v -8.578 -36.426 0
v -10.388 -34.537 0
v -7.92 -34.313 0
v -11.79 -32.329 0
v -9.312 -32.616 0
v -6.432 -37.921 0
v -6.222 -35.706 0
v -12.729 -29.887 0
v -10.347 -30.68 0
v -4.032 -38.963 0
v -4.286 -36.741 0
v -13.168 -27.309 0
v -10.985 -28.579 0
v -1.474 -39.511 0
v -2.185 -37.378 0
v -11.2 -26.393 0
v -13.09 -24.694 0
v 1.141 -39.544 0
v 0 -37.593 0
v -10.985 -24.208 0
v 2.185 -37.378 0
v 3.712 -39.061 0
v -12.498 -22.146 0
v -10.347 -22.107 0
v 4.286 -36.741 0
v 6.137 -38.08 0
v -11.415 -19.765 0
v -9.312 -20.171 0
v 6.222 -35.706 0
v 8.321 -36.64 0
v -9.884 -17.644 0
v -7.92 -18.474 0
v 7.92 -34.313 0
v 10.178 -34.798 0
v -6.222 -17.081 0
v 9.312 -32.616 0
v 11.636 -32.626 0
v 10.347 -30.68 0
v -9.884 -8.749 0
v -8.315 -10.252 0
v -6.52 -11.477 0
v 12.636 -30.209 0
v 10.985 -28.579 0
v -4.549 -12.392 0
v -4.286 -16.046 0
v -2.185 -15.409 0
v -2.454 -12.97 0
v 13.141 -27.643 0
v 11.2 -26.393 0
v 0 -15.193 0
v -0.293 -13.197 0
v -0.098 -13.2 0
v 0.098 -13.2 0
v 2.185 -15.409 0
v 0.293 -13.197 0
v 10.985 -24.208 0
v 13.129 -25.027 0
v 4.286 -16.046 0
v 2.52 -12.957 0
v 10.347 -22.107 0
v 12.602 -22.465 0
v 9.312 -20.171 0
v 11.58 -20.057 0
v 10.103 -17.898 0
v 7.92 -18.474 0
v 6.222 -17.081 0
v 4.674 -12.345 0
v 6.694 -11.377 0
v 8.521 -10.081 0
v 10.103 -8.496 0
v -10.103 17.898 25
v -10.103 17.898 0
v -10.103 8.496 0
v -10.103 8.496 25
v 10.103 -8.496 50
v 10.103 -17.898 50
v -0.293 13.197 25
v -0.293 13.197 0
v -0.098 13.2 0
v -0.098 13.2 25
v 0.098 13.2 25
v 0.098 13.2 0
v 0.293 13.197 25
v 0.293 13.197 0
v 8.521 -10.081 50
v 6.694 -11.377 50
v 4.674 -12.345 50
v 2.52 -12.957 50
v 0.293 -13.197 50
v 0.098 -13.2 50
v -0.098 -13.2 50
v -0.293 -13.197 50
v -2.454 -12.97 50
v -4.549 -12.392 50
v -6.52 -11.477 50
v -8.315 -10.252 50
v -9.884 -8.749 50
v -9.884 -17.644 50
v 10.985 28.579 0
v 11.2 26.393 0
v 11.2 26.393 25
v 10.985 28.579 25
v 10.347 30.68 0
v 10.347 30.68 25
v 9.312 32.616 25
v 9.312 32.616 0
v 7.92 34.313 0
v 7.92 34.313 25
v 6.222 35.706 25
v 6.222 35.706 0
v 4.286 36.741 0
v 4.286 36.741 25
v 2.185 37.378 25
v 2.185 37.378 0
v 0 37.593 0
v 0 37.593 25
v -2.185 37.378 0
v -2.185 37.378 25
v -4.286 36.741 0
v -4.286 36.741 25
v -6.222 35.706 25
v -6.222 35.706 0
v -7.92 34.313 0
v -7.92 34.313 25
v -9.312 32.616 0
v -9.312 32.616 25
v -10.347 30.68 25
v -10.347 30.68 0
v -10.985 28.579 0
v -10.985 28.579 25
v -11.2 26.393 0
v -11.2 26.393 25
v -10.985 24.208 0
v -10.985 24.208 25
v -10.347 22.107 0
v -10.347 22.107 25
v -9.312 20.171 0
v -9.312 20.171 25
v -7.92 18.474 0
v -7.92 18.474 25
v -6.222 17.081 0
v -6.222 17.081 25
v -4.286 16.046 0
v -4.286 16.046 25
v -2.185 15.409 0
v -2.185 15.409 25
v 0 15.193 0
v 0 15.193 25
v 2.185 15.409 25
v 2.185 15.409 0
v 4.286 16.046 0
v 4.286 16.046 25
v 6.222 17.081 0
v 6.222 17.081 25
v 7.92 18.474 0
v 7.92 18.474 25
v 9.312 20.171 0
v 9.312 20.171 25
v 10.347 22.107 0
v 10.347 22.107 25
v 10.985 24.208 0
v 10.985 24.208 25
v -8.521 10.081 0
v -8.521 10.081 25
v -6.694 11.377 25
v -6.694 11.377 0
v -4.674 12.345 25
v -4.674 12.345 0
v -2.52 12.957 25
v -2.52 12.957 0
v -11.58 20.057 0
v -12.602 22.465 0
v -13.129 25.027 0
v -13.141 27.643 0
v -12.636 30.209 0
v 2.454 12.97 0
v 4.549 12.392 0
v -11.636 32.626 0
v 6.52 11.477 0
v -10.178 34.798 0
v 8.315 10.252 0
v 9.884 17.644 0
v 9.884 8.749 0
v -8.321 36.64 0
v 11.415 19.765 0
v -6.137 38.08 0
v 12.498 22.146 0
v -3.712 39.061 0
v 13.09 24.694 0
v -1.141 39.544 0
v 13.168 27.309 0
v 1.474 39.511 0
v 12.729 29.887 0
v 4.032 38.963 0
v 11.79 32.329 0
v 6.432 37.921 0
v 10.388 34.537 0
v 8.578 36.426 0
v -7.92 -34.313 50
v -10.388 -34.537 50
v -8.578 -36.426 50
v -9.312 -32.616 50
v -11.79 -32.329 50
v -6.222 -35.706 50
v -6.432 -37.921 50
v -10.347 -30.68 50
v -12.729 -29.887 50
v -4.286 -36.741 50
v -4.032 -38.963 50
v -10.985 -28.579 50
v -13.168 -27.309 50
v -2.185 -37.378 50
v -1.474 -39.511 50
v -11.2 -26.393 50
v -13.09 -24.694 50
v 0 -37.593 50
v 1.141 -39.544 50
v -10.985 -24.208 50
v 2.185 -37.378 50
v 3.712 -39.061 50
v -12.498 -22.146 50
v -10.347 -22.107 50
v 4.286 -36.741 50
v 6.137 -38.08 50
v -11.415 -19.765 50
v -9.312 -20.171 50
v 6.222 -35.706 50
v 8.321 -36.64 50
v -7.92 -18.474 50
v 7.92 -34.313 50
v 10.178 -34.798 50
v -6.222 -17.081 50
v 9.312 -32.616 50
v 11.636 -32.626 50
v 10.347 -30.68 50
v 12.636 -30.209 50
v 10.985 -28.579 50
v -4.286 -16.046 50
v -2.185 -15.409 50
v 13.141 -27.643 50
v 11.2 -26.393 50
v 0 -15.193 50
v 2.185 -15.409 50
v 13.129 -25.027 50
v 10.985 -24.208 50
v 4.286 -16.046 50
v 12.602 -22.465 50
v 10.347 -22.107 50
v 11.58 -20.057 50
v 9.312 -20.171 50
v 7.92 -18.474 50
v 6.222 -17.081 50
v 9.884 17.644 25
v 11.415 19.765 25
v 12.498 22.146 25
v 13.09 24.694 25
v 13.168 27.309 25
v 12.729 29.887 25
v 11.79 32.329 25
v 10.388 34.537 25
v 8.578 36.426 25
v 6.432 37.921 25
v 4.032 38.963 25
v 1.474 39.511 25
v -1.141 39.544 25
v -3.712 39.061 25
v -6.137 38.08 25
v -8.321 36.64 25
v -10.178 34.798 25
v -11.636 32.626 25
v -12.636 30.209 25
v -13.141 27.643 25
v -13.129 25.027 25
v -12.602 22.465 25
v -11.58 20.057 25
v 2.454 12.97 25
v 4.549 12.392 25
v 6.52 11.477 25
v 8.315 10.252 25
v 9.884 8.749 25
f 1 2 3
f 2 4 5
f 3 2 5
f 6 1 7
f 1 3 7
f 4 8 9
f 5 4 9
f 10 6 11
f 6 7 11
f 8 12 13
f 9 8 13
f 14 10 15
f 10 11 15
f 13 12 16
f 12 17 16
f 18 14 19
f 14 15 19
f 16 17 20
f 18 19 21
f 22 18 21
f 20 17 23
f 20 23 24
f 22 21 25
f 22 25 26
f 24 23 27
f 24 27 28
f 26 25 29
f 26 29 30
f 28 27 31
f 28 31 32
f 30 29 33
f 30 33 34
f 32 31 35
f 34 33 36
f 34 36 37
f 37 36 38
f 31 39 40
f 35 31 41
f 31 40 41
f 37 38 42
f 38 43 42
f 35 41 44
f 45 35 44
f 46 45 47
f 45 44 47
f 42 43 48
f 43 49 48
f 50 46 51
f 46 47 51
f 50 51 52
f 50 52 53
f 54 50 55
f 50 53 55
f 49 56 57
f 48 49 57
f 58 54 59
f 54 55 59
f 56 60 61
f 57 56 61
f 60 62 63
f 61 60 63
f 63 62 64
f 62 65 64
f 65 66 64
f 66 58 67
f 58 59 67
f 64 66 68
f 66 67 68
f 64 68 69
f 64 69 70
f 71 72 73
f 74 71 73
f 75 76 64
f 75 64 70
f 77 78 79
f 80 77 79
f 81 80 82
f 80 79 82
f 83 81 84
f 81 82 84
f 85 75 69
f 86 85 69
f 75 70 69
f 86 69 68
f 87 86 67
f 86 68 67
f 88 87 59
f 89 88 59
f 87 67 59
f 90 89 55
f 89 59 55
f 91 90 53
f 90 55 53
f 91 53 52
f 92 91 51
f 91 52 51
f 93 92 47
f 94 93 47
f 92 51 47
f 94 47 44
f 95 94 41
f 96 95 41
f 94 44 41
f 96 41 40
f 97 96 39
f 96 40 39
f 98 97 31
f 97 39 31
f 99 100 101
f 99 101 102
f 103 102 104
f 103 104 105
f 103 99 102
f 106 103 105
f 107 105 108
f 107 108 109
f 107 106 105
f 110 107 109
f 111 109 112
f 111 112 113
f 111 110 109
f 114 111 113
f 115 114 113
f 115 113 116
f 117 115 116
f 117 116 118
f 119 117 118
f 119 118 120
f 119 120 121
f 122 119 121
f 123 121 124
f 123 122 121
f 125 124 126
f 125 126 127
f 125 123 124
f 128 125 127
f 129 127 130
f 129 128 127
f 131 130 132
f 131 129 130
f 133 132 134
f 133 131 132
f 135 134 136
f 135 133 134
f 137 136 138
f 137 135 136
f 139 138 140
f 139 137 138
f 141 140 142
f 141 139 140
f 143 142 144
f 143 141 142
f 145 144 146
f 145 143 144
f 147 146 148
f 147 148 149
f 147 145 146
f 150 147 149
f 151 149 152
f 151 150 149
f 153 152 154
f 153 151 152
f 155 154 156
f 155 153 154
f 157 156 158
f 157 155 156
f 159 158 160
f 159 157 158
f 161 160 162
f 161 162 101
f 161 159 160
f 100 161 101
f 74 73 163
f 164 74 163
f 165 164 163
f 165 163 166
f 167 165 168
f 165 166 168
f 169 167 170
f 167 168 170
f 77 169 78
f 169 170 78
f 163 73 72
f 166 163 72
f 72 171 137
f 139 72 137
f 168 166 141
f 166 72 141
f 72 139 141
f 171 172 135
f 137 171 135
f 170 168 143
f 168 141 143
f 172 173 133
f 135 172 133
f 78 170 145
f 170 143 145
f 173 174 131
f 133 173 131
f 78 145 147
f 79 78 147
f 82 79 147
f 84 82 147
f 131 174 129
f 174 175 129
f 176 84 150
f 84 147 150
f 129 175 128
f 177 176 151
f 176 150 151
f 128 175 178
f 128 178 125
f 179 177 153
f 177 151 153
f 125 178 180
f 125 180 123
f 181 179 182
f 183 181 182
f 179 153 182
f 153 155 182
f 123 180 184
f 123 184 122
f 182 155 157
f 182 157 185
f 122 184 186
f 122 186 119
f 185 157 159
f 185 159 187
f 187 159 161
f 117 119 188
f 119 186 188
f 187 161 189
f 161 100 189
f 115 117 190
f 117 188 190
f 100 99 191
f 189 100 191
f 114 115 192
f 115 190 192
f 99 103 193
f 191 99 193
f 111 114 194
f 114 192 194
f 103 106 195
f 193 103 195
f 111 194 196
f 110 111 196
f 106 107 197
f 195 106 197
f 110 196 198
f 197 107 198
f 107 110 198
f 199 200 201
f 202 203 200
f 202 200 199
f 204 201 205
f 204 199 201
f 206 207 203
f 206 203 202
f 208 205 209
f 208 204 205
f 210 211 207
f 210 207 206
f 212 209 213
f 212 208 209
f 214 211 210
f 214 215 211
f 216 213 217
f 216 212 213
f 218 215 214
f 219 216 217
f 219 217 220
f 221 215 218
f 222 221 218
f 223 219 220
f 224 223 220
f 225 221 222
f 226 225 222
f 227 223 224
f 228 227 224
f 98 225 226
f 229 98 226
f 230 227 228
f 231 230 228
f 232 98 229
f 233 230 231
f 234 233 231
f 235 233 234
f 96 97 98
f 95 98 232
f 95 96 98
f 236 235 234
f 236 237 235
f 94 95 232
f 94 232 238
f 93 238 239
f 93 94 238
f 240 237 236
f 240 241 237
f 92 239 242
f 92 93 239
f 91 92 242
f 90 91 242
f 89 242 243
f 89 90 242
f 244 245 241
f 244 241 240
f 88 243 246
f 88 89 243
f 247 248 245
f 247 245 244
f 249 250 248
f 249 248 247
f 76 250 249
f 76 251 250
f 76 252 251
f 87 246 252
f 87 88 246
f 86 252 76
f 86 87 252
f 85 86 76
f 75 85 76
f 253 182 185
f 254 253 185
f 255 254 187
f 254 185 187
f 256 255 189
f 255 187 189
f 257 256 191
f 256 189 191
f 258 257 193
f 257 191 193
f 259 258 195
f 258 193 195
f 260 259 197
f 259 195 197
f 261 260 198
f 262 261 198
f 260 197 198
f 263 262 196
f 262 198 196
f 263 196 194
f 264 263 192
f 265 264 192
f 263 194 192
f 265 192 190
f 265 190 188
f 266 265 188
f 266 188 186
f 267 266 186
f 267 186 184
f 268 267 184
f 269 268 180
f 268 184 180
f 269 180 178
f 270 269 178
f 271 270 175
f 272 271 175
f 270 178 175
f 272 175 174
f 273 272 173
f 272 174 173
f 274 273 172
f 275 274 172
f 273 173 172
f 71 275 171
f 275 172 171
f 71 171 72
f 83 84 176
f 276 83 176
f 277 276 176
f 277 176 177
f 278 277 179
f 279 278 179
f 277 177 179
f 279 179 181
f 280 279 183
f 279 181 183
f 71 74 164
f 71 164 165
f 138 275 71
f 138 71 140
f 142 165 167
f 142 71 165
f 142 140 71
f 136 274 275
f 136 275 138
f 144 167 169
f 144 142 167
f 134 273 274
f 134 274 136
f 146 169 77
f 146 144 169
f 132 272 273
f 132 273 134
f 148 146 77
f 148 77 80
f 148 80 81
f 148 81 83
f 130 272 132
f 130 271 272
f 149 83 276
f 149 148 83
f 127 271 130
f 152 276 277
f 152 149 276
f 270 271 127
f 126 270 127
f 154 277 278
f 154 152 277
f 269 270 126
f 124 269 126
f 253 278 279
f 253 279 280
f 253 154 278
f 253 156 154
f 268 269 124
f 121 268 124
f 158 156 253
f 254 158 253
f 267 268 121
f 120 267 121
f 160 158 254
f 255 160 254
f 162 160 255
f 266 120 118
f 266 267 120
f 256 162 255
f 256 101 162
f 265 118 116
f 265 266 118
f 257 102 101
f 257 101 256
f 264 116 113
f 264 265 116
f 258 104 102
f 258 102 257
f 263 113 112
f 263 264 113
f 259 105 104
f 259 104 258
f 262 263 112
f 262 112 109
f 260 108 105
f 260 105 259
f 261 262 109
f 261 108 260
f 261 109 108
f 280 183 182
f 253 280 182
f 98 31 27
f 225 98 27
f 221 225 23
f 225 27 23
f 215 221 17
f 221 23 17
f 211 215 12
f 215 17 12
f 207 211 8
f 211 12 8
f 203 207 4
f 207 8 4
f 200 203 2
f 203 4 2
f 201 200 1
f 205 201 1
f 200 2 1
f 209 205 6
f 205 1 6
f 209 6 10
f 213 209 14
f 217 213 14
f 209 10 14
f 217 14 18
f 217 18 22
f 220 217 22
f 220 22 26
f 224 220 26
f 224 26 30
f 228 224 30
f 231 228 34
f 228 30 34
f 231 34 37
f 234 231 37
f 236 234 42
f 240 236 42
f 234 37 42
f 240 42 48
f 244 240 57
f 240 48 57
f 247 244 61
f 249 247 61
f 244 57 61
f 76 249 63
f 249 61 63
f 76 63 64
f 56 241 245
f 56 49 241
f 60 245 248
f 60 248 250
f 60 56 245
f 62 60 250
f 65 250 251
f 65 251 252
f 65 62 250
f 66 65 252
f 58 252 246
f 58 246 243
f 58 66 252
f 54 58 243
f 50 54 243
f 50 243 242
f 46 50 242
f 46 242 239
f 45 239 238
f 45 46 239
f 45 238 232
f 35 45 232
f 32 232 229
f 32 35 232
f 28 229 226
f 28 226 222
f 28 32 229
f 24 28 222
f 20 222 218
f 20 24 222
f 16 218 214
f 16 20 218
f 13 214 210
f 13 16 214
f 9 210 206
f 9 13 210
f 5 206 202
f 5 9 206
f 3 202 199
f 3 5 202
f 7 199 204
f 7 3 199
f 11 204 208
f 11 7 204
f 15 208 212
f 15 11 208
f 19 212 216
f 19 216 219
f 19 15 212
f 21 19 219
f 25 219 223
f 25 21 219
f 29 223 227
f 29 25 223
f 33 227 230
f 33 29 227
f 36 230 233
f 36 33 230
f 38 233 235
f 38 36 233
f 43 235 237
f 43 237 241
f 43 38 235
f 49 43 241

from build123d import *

# Parameters (mm, degrees)
F0_R     = 11.2
F1_DEPTH = 25
F2_DEPTH = 25


with BuildPart() as f1:
    # F0 (on Top) → F1 (new body)
    with BuildSketch(Plane.XY):
        with BuildLine():
            Line((10.1025993742, -17.8977583819), (10.1025993742, -8.4957333929))
            ThreePointArc((10.1025993742, -8.4957333929), (5.7045977621, -11.9036786068), (0.2930835775, -13.1967458874))
            ThreePointArc((0.2930835775, -13.1967458874), (0, -13.2), (-0.2930835775, -13.1967458874))
            ThreePointArc((-0.2930835775, -13.1967458874), (-5.553116016, -11.9750950941), (-9.8837928053, -8.749322247))
            Line((-9.8837928053, -8.749322247), (-9.8837928053, -17.6441695278))
            ThreePointArc((-9.8837928053, -17.6441695278), (-0.1674691177, -39.5924293871), (10.1025993742, -17.8977583819))
        make_face()
        with Locations((0, -26.3934917748)):
            Circle(F0_R, mode=Mode.SUBTRACT)
    extrude(amount=F1_DEPTH)

    # F2 (add): a face of the model
    f2_faces = [f1.faces().sort_by_distance(p)[0] for p in [
        (9.6946740654, -13.1967458874, 25),
    ]]
    extrude(f2_faces, amount=F2_DEPTH)


with BuildPart() as f1b:
    # F0 (on Top) → F1, piece 2 (new body)
    with BuildSketch(Plane.XY):
        with BuildLine():
            ThreePointArc((0.2930835775, 13.1967458874), (5.553116016, 11.9750950941), (9.8837928053, 8.749322247))
            Line((9.8837928053, 8.749322247), (9.8837928053, 17.6441695278))
            ThreePointArc((9.8837928053, 17.6441695278), (0.1674691177, 39.5924293871), (-10.1025993742, 17.8977583819))
            Line((-10.1025993742, 17.8977583819), (-10.1025993742, 8.4957333929))
            ThreePointArc((-10.1025993742, 8.4957333929), (-5.7045977621, 11.9036786068), (-0.2930835775, 13.1967458874))
            ThreePointArc((-0.2930835775, 13.1967458874), (0, 13.2), (0.2930835775, 13.1967458874))
        make_face()
        with Locations((0, 26.3934917748)):
            Circle(F0_R, mode=Mode.SUBTRACT)
    extrude(amount=F1_DEPTH)


solid = Compound([f1.part, f1b.part])
